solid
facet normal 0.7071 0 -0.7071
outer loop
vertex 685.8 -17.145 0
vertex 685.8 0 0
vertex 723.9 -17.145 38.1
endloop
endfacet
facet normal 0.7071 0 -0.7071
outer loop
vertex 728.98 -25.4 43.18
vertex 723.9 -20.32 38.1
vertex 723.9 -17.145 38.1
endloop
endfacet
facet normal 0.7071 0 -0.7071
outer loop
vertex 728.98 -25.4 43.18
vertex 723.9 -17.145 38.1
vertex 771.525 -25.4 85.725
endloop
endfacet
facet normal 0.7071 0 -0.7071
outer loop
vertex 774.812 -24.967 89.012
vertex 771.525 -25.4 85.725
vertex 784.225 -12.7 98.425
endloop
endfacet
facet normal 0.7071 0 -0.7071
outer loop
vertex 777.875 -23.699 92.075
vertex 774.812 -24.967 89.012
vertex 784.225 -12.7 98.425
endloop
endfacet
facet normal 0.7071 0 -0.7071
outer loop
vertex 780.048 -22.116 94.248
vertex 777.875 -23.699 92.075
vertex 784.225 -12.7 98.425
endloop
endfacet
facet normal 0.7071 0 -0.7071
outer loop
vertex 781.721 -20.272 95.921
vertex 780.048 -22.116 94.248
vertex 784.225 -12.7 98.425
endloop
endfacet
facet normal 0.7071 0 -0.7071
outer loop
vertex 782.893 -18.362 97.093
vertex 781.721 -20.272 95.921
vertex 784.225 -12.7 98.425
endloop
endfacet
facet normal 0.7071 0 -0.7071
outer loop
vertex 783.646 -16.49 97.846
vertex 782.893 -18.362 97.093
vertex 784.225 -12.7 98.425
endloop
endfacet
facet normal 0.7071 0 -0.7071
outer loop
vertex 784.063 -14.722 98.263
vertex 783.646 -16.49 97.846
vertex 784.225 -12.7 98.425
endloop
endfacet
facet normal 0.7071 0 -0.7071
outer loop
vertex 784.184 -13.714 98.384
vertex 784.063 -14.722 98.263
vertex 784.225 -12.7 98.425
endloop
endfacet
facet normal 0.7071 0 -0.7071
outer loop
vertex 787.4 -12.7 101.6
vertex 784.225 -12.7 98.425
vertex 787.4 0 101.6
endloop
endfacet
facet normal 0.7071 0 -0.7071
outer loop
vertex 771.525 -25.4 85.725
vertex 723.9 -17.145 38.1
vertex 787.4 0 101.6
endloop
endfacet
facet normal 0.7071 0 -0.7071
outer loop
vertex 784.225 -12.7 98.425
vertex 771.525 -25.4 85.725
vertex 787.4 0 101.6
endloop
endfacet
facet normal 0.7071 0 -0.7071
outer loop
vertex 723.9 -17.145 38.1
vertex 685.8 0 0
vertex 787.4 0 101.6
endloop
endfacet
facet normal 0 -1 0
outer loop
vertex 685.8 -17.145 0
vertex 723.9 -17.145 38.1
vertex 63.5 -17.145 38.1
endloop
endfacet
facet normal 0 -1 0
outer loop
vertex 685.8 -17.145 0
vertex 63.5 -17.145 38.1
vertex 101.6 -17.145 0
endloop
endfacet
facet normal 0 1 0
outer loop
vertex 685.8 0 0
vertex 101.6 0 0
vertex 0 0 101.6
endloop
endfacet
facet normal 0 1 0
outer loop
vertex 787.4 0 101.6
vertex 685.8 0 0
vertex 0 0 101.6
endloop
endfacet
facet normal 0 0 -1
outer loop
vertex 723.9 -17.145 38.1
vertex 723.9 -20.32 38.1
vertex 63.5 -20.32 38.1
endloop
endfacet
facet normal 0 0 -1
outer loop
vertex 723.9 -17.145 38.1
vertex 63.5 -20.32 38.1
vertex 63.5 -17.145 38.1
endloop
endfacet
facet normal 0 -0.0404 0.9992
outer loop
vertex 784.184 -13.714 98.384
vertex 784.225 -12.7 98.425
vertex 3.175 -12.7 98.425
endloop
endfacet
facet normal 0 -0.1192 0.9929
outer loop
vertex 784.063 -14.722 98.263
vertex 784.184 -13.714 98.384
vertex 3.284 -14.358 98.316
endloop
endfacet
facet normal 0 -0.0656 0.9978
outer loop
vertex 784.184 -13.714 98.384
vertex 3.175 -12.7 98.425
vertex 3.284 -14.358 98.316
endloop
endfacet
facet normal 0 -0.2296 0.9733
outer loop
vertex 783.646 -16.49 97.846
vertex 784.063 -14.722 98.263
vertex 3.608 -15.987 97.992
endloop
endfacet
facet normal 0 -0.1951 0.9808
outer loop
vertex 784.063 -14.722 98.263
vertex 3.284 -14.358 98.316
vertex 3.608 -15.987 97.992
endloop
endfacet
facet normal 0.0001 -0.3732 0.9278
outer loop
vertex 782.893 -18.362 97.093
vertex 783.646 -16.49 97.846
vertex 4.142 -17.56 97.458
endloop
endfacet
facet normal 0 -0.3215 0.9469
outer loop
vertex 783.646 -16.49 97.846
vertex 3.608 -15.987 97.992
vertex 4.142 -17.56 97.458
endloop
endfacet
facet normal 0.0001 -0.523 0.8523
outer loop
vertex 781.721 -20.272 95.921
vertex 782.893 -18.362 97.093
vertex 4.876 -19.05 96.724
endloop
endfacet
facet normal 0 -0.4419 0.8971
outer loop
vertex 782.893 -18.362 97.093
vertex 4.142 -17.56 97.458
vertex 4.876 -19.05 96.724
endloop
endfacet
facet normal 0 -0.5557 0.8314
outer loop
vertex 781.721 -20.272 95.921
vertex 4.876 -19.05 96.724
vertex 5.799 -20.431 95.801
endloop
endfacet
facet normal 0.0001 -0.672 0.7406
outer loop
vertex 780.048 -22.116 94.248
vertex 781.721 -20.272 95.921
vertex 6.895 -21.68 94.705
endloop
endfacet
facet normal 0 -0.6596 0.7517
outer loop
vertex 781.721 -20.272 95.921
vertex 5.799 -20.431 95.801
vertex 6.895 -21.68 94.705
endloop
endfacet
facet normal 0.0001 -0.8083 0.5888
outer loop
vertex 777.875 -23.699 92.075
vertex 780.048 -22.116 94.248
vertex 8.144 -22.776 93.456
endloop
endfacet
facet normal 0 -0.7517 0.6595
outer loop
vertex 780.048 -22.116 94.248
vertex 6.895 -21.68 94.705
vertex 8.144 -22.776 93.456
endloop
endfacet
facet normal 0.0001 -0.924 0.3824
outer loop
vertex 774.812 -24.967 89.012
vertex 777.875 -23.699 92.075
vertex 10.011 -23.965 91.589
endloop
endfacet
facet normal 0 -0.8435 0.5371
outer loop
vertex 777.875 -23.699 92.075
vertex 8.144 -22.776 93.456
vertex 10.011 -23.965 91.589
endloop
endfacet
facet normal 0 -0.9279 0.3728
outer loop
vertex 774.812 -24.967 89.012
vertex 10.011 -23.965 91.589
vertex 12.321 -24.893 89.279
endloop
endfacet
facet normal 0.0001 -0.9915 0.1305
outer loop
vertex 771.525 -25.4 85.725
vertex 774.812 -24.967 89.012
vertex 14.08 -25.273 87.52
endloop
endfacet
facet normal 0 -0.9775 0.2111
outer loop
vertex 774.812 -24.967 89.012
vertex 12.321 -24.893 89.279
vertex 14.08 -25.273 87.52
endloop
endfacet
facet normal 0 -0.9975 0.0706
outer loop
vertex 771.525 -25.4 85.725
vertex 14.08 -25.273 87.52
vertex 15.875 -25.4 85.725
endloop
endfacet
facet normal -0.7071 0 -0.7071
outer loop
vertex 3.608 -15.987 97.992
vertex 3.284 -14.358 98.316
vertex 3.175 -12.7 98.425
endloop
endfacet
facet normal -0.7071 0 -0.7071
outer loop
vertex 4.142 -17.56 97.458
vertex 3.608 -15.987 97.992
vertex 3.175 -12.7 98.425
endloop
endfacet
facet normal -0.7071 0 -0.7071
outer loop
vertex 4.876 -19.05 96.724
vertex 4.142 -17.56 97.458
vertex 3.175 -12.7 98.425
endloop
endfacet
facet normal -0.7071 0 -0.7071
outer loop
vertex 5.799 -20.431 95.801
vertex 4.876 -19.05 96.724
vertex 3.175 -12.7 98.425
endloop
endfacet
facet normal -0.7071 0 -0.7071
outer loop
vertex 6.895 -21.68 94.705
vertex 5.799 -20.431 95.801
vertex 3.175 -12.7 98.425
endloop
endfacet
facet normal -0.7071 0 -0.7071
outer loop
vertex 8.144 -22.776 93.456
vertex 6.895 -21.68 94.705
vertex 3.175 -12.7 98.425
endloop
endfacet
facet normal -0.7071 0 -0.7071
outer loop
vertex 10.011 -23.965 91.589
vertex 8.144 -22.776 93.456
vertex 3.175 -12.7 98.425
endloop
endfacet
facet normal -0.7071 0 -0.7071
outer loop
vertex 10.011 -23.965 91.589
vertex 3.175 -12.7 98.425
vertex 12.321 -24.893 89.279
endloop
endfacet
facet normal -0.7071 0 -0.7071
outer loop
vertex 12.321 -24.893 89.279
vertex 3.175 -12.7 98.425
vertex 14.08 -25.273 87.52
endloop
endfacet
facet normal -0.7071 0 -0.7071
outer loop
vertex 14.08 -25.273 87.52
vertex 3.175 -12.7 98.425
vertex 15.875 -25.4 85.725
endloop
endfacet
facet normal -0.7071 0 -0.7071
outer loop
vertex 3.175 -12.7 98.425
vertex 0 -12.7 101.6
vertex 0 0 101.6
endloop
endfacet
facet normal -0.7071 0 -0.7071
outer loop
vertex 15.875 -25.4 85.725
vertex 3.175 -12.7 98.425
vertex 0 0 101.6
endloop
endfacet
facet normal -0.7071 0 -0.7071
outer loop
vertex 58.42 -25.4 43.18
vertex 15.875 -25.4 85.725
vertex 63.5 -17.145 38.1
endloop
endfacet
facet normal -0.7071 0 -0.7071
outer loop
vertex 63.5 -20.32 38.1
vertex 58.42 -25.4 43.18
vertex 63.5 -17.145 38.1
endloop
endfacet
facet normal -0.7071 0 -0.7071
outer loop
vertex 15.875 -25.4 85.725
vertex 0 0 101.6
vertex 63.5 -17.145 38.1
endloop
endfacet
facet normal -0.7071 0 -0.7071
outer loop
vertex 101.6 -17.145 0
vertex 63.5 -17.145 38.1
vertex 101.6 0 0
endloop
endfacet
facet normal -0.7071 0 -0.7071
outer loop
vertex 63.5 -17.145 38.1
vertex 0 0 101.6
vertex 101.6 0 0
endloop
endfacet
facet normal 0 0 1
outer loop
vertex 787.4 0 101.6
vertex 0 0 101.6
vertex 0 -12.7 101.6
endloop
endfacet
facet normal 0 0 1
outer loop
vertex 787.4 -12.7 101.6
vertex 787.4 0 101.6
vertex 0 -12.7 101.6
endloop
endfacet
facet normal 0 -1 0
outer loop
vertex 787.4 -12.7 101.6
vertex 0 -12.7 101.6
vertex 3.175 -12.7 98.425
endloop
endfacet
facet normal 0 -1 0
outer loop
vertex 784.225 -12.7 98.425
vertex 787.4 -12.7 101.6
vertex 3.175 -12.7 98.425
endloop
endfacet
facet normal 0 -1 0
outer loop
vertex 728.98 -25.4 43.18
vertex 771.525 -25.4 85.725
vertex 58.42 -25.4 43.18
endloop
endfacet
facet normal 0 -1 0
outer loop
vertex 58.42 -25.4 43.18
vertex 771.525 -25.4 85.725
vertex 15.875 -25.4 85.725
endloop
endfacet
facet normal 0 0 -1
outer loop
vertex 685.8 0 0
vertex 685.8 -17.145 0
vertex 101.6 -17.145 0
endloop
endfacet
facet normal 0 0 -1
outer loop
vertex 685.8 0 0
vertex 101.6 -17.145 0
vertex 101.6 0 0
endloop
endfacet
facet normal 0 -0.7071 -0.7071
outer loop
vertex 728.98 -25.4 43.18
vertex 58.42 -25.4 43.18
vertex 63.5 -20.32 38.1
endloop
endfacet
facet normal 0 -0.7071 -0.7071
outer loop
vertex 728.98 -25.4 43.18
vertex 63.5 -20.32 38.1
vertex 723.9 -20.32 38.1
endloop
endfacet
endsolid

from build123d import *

# Parameters (mm, degrees)
F1_DEPTH = 787.4
F3_DEPTH = 25.4
F4_SIZE  = 5.08


with BuildPart() as f1:
    # F0 (on Right) → F1 (new body)
    with BuildSketch(Plane.YZ):
        with BuildLine():
            Line((-17.145, 0), (0, 0))
            Line((0, 0), (0, 101.6))
            Line((0, 101.6), (-12.7, 101.6))
            Line((-12.7, 101.6), (-12.7, 98.425))
            ThreePointArc((-12.7, 98.425), (-21.680256, 94.705256), (-25.4, 85.725))
            Line((-25.4, 85.725), (-25.4, 38.1))
            Line((-25.4, 38.1), (-17.145, 38.1))
            Line((-17.145, 38.1), (-17.145, 0))
        make_face()
    extrude(amount=F1_DEPTH)

    # F2 (on face) → F3 (cut)
    with BuildSketch(Plane(origin=(0, 0, 0), x_dir=(-1, 0, 0), z_dir=(0, 1, 0))):
        Polygon((-685.8, 0), (-787.4, 101.6), (-787.4, 0), align=None)
        Polygon((0, 0), (0, 101.6), (-101.6, 0), align=None)
    extrude(amount=-F3_DEPTH, mode=Mode.SUBTRACT)

    # F4
    f4_edges = [f1.edges().sort_by_distance(p)[0] for p in [
        (393.7, -25.4, 38.1),
    ]]
    chamfer(f4_edges, length=F4_SIZE)


solid = f1.part
